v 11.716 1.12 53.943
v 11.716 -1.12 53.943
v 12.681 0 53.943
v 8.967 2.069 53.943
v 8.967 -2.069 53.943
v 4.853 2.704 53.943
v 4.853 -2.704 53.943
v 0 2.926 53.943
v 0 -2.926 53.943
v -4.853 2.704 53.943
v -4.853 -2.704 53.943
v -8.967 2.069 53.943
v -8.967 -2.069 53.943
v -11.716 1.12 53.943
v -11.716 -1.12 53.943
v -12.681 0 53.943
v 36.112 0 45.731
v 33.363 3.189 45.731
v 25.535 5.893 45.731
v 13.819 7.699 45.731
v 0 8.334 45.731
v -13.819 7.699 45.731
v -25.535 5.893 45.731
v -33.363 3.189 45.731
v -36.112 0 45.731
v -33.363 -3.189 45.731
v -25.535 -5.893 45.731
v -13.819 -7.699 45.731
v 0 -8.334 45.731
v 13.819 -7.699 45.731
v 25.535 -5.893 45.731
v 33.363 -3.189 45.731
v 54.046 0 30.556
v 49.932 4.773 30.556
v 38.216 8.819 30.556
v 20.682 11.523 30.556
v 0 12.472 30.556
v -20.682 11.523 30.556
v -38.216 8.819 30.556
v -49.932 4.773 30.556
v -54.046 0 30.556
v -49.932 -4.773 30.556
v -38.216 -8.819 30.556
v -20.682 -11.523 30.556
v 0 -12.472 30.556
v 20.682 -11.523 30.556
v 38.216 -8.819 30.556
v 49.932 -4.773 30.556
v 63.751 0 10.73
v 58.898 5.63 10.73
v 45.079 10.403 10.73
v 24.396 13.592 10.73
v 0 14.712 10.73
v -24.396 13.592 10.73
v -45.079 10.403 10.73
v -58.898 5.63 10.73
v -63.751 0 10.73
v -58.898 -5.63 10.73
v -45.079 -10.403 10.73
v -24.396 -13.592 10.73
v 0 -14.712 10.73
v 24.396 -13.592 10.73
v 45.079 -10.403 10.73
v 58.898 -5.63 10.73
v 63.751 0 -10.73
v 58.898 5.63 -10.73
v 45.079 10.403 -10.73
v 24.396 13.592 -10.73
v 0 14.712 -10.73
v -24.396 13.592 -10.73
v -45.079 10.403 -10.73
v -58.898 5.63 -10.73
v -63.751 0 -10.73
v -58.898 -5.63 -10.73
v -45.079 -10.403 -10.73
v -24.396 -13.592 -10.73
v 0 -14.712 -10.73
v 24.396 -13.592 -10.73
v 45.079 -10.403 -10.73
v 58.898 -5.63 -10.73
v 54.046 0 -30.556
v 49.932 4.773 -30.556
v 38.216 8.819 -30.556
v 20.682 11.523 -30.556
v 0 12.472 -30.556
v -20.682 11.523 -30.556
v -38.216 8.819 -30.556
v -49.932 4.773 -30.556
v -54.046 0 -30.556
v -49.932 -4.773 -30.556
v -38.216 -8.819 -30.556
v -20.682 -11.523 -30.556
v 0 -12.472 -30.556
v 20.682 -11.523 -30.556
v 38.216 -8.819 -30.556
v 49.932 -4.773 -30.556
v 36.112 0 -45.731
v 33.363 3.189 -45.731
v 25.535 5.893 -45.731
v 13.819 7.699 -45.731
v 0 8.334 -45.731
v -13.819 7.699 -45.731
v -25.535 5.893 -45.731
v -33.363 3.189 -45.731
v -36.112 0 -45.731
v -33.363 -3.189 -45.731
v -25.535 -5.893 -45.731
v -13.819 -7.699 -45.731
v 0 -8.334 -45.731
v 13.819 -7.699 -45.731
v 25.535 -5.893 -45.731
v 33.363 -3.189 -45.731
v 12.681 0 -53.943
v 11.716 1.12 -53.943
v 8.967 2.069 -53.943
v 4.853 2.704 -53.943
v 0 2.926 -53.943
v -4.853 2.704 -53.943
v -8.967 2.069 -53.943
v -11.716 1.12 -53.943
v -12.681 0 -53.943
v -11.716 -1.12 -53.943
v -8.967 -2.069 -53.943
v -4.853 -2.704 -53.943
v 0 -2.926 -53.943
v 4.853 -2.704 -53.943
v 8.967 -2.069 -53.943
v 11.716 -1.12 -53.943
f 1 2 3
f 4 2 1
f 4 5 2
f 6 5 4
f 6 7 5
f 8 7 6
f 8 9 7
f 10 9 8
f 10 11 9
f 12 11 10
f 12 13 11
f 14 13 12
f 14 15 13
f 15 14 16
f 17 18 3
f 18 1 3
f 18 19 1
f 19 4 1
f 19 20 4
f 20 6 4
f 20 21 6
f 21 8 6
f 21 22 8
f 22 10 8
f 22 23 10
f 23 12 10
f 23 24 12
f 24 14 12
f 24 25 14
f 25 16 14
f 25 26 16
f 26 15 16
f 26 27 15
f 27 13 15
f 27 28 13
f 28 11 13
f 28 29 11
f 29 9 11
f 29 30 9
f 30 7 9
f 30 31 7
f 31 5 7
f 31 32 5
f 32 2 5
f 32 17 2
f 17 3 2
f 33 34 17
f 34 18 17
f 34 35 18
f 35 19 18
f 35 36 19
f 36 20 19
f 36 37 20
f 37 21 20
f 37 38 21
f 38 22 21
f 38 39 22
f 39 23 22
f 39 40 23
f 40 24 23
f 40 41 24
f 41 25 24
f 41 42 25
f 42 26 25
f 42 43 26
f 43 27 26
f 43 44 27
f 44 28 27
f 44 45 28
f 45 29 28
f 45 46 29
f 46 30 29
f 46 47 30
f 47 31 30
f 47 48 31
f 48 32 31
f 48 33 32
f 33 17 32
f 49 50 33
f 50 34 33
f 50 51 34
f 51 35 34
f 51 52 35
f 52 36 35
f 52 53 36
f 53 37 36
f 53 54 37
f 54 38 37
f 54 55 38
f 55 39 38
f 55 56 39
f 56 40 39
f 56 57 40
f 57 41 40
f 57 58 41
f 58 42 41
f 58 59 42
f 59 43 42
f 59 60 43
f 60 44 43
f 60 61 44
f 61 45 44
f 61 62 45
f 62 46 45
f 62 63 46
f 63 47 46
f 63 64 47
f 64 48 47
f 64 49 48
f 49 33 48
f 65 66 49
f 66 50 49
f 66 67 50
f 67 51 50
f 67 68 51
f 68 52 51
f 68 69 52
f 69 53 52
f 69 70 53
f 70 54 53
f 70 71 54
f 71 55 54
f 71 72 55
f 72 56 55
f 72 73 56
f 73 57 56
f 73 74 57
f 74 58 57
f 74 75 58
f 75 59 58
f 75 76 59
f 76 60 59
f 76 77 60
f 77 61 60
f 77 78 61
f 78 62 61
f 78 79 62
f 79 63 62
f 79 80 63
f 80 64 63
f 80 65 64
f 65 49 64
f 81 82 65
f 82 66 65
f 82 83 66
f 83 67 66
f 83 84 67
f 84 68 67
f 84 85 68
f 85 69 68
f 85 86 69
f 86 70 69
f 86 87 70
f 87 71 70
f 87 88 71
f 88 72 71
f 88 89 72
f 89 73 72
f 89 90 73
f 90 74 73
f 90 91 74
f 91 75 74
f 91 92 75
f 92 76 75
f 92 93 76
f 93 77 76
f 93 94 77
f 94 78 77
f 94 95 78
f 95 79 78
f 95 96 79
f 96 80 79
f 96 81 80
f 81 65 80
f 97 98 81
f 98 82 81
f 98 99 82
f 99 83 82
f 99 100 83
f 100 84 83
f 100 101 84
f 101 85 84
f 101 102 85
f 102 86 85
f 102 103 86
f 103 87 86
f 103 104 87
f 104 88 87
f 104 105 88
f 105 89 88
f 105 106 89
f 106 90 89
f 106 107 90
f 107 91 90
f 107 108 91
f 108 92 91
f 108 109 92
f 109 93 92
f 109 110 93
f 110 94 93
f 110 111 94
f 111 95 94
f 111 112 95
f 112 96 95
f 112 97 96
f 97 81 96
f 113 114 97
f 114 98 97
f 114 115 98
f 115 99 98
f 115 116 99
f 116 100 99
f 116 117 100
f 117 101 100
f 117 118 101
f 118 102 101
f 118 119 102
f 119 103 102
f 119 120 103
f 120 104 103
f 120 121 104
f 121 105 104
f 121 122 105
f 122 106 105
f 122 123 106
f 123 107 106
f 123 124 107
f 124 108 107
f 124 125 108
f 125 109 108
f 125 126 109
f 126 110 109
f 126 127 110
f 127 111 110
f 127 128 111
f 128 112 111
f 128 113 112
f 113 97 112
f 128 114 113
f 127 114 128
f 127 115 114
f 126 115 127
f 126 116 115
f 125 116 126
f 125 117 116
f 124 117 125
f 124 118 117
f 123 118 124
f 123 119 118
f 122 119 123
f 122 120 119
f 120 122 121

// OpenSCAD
// Generated by SolidPython 1.0.1 on 2020-07-29 00:46:50


scale(v = [13, 3, 11]) {
	sphere(r = 5);
}
/***********************************************
*********      SolidPython code:      **********
************************************************
 
# import packages: SolidPython
from solid import *
from solid.utils import *
from itertools import chain, combinations, permutations


class Resize:

    def __init__(self, scad_file):
        self.scad_file = scad_file
        #self.scad_file = import_scad(scad_file)
        # cone/cylinder param:
        self.r1 = 0
        self.r2 = 0
        self.h = 0
        # rectangular prism param:
        self.w = 0
        self.l = 0
        # ellipse param:
        self.r = 0

    # import OpenScad code (file name corresponds to shape)


    # classify shape + parameters
    def assign(self, param1, param2, param3):
        if self.scad_file == 'cone.scad':
            self.r1 = param1
            self.r2 = param2
            self.h = param3
        elif self.scad_file == 'cylinder.scad':
            self.r1 = param1
            self.r2 = param2
            self.h = param3
        elif self.scad_file == 'rectangularPrism.scad':
            self.h = param1
            self.l = param2
            self.w = param3
        else:
            self.r = param1
            self.h = param2

    # resize parameters
    def iterate(self):
        x = range(3, 20, 2)
        i = 1
        if self.scad_file == 'cone.scad':
            tempList = list(permutations(x, 2))
            for temp in tempList:
                param1 = temp[0]
                param2 = temp[1]
                filepath = 'produced_scad_files/' + 'cone' + str(param1) + '_' + str(param2) + '_' + '.scad'
                scad_render_to_file(cylinder(h=param1, r1=param2, r2=0), filepath)

        elif self.scad_file == 'cylinder.scad':
            tempList = list(permutations(x, 3))
            for temp in tempList:
                param1 = temp[0]
                param2 = temp[1]
                filepath = 'produced_scad_files/' + 'cylinder' + str(param1) + '_' + str(param2) + '_' + '.scad'
                scad_render_to_file(cylinder(h=param1, r1=param2, r2=param2), filepath)

        elif self.scad_file == 'rectangularPrism.scad':
            tempList = list(permutations(x, 3))
            for temp in tempList:
                param1 = temp[0]
                param2 = temp[1]
                param3 = temp[2]
                filepath = 'produced_scad_files/' + 'rectangularPrism' + str(param1) + '_' + str(param2) + '_' + str(
                    param3) + '.scad'
                scad_render_to_file(cube(size=(param1, param2, param3)), filepath)

        elif self.scad_file == 'ellipse.scad':
            tempList = list(permutations(x, 4))
            for temp in tempList:
                param1 = temp[0]
                param2 = temp[1]
                param3 = temp[2]
                param4 = temp[3]
                filepath = 'produced_scad_files/' + 'ellipse' + str(param1) + '_' + str(param2) + '_' + str(param3) + '_' + str(param4) + '.scad'
                scad_render_to_file(scale([param1, param2, param3])(sphere(r=param4)), filepath)

    def render_to_scadfile(self):
        scad_render_to_file(scad, 'example.scad') 
 
************************************************/
